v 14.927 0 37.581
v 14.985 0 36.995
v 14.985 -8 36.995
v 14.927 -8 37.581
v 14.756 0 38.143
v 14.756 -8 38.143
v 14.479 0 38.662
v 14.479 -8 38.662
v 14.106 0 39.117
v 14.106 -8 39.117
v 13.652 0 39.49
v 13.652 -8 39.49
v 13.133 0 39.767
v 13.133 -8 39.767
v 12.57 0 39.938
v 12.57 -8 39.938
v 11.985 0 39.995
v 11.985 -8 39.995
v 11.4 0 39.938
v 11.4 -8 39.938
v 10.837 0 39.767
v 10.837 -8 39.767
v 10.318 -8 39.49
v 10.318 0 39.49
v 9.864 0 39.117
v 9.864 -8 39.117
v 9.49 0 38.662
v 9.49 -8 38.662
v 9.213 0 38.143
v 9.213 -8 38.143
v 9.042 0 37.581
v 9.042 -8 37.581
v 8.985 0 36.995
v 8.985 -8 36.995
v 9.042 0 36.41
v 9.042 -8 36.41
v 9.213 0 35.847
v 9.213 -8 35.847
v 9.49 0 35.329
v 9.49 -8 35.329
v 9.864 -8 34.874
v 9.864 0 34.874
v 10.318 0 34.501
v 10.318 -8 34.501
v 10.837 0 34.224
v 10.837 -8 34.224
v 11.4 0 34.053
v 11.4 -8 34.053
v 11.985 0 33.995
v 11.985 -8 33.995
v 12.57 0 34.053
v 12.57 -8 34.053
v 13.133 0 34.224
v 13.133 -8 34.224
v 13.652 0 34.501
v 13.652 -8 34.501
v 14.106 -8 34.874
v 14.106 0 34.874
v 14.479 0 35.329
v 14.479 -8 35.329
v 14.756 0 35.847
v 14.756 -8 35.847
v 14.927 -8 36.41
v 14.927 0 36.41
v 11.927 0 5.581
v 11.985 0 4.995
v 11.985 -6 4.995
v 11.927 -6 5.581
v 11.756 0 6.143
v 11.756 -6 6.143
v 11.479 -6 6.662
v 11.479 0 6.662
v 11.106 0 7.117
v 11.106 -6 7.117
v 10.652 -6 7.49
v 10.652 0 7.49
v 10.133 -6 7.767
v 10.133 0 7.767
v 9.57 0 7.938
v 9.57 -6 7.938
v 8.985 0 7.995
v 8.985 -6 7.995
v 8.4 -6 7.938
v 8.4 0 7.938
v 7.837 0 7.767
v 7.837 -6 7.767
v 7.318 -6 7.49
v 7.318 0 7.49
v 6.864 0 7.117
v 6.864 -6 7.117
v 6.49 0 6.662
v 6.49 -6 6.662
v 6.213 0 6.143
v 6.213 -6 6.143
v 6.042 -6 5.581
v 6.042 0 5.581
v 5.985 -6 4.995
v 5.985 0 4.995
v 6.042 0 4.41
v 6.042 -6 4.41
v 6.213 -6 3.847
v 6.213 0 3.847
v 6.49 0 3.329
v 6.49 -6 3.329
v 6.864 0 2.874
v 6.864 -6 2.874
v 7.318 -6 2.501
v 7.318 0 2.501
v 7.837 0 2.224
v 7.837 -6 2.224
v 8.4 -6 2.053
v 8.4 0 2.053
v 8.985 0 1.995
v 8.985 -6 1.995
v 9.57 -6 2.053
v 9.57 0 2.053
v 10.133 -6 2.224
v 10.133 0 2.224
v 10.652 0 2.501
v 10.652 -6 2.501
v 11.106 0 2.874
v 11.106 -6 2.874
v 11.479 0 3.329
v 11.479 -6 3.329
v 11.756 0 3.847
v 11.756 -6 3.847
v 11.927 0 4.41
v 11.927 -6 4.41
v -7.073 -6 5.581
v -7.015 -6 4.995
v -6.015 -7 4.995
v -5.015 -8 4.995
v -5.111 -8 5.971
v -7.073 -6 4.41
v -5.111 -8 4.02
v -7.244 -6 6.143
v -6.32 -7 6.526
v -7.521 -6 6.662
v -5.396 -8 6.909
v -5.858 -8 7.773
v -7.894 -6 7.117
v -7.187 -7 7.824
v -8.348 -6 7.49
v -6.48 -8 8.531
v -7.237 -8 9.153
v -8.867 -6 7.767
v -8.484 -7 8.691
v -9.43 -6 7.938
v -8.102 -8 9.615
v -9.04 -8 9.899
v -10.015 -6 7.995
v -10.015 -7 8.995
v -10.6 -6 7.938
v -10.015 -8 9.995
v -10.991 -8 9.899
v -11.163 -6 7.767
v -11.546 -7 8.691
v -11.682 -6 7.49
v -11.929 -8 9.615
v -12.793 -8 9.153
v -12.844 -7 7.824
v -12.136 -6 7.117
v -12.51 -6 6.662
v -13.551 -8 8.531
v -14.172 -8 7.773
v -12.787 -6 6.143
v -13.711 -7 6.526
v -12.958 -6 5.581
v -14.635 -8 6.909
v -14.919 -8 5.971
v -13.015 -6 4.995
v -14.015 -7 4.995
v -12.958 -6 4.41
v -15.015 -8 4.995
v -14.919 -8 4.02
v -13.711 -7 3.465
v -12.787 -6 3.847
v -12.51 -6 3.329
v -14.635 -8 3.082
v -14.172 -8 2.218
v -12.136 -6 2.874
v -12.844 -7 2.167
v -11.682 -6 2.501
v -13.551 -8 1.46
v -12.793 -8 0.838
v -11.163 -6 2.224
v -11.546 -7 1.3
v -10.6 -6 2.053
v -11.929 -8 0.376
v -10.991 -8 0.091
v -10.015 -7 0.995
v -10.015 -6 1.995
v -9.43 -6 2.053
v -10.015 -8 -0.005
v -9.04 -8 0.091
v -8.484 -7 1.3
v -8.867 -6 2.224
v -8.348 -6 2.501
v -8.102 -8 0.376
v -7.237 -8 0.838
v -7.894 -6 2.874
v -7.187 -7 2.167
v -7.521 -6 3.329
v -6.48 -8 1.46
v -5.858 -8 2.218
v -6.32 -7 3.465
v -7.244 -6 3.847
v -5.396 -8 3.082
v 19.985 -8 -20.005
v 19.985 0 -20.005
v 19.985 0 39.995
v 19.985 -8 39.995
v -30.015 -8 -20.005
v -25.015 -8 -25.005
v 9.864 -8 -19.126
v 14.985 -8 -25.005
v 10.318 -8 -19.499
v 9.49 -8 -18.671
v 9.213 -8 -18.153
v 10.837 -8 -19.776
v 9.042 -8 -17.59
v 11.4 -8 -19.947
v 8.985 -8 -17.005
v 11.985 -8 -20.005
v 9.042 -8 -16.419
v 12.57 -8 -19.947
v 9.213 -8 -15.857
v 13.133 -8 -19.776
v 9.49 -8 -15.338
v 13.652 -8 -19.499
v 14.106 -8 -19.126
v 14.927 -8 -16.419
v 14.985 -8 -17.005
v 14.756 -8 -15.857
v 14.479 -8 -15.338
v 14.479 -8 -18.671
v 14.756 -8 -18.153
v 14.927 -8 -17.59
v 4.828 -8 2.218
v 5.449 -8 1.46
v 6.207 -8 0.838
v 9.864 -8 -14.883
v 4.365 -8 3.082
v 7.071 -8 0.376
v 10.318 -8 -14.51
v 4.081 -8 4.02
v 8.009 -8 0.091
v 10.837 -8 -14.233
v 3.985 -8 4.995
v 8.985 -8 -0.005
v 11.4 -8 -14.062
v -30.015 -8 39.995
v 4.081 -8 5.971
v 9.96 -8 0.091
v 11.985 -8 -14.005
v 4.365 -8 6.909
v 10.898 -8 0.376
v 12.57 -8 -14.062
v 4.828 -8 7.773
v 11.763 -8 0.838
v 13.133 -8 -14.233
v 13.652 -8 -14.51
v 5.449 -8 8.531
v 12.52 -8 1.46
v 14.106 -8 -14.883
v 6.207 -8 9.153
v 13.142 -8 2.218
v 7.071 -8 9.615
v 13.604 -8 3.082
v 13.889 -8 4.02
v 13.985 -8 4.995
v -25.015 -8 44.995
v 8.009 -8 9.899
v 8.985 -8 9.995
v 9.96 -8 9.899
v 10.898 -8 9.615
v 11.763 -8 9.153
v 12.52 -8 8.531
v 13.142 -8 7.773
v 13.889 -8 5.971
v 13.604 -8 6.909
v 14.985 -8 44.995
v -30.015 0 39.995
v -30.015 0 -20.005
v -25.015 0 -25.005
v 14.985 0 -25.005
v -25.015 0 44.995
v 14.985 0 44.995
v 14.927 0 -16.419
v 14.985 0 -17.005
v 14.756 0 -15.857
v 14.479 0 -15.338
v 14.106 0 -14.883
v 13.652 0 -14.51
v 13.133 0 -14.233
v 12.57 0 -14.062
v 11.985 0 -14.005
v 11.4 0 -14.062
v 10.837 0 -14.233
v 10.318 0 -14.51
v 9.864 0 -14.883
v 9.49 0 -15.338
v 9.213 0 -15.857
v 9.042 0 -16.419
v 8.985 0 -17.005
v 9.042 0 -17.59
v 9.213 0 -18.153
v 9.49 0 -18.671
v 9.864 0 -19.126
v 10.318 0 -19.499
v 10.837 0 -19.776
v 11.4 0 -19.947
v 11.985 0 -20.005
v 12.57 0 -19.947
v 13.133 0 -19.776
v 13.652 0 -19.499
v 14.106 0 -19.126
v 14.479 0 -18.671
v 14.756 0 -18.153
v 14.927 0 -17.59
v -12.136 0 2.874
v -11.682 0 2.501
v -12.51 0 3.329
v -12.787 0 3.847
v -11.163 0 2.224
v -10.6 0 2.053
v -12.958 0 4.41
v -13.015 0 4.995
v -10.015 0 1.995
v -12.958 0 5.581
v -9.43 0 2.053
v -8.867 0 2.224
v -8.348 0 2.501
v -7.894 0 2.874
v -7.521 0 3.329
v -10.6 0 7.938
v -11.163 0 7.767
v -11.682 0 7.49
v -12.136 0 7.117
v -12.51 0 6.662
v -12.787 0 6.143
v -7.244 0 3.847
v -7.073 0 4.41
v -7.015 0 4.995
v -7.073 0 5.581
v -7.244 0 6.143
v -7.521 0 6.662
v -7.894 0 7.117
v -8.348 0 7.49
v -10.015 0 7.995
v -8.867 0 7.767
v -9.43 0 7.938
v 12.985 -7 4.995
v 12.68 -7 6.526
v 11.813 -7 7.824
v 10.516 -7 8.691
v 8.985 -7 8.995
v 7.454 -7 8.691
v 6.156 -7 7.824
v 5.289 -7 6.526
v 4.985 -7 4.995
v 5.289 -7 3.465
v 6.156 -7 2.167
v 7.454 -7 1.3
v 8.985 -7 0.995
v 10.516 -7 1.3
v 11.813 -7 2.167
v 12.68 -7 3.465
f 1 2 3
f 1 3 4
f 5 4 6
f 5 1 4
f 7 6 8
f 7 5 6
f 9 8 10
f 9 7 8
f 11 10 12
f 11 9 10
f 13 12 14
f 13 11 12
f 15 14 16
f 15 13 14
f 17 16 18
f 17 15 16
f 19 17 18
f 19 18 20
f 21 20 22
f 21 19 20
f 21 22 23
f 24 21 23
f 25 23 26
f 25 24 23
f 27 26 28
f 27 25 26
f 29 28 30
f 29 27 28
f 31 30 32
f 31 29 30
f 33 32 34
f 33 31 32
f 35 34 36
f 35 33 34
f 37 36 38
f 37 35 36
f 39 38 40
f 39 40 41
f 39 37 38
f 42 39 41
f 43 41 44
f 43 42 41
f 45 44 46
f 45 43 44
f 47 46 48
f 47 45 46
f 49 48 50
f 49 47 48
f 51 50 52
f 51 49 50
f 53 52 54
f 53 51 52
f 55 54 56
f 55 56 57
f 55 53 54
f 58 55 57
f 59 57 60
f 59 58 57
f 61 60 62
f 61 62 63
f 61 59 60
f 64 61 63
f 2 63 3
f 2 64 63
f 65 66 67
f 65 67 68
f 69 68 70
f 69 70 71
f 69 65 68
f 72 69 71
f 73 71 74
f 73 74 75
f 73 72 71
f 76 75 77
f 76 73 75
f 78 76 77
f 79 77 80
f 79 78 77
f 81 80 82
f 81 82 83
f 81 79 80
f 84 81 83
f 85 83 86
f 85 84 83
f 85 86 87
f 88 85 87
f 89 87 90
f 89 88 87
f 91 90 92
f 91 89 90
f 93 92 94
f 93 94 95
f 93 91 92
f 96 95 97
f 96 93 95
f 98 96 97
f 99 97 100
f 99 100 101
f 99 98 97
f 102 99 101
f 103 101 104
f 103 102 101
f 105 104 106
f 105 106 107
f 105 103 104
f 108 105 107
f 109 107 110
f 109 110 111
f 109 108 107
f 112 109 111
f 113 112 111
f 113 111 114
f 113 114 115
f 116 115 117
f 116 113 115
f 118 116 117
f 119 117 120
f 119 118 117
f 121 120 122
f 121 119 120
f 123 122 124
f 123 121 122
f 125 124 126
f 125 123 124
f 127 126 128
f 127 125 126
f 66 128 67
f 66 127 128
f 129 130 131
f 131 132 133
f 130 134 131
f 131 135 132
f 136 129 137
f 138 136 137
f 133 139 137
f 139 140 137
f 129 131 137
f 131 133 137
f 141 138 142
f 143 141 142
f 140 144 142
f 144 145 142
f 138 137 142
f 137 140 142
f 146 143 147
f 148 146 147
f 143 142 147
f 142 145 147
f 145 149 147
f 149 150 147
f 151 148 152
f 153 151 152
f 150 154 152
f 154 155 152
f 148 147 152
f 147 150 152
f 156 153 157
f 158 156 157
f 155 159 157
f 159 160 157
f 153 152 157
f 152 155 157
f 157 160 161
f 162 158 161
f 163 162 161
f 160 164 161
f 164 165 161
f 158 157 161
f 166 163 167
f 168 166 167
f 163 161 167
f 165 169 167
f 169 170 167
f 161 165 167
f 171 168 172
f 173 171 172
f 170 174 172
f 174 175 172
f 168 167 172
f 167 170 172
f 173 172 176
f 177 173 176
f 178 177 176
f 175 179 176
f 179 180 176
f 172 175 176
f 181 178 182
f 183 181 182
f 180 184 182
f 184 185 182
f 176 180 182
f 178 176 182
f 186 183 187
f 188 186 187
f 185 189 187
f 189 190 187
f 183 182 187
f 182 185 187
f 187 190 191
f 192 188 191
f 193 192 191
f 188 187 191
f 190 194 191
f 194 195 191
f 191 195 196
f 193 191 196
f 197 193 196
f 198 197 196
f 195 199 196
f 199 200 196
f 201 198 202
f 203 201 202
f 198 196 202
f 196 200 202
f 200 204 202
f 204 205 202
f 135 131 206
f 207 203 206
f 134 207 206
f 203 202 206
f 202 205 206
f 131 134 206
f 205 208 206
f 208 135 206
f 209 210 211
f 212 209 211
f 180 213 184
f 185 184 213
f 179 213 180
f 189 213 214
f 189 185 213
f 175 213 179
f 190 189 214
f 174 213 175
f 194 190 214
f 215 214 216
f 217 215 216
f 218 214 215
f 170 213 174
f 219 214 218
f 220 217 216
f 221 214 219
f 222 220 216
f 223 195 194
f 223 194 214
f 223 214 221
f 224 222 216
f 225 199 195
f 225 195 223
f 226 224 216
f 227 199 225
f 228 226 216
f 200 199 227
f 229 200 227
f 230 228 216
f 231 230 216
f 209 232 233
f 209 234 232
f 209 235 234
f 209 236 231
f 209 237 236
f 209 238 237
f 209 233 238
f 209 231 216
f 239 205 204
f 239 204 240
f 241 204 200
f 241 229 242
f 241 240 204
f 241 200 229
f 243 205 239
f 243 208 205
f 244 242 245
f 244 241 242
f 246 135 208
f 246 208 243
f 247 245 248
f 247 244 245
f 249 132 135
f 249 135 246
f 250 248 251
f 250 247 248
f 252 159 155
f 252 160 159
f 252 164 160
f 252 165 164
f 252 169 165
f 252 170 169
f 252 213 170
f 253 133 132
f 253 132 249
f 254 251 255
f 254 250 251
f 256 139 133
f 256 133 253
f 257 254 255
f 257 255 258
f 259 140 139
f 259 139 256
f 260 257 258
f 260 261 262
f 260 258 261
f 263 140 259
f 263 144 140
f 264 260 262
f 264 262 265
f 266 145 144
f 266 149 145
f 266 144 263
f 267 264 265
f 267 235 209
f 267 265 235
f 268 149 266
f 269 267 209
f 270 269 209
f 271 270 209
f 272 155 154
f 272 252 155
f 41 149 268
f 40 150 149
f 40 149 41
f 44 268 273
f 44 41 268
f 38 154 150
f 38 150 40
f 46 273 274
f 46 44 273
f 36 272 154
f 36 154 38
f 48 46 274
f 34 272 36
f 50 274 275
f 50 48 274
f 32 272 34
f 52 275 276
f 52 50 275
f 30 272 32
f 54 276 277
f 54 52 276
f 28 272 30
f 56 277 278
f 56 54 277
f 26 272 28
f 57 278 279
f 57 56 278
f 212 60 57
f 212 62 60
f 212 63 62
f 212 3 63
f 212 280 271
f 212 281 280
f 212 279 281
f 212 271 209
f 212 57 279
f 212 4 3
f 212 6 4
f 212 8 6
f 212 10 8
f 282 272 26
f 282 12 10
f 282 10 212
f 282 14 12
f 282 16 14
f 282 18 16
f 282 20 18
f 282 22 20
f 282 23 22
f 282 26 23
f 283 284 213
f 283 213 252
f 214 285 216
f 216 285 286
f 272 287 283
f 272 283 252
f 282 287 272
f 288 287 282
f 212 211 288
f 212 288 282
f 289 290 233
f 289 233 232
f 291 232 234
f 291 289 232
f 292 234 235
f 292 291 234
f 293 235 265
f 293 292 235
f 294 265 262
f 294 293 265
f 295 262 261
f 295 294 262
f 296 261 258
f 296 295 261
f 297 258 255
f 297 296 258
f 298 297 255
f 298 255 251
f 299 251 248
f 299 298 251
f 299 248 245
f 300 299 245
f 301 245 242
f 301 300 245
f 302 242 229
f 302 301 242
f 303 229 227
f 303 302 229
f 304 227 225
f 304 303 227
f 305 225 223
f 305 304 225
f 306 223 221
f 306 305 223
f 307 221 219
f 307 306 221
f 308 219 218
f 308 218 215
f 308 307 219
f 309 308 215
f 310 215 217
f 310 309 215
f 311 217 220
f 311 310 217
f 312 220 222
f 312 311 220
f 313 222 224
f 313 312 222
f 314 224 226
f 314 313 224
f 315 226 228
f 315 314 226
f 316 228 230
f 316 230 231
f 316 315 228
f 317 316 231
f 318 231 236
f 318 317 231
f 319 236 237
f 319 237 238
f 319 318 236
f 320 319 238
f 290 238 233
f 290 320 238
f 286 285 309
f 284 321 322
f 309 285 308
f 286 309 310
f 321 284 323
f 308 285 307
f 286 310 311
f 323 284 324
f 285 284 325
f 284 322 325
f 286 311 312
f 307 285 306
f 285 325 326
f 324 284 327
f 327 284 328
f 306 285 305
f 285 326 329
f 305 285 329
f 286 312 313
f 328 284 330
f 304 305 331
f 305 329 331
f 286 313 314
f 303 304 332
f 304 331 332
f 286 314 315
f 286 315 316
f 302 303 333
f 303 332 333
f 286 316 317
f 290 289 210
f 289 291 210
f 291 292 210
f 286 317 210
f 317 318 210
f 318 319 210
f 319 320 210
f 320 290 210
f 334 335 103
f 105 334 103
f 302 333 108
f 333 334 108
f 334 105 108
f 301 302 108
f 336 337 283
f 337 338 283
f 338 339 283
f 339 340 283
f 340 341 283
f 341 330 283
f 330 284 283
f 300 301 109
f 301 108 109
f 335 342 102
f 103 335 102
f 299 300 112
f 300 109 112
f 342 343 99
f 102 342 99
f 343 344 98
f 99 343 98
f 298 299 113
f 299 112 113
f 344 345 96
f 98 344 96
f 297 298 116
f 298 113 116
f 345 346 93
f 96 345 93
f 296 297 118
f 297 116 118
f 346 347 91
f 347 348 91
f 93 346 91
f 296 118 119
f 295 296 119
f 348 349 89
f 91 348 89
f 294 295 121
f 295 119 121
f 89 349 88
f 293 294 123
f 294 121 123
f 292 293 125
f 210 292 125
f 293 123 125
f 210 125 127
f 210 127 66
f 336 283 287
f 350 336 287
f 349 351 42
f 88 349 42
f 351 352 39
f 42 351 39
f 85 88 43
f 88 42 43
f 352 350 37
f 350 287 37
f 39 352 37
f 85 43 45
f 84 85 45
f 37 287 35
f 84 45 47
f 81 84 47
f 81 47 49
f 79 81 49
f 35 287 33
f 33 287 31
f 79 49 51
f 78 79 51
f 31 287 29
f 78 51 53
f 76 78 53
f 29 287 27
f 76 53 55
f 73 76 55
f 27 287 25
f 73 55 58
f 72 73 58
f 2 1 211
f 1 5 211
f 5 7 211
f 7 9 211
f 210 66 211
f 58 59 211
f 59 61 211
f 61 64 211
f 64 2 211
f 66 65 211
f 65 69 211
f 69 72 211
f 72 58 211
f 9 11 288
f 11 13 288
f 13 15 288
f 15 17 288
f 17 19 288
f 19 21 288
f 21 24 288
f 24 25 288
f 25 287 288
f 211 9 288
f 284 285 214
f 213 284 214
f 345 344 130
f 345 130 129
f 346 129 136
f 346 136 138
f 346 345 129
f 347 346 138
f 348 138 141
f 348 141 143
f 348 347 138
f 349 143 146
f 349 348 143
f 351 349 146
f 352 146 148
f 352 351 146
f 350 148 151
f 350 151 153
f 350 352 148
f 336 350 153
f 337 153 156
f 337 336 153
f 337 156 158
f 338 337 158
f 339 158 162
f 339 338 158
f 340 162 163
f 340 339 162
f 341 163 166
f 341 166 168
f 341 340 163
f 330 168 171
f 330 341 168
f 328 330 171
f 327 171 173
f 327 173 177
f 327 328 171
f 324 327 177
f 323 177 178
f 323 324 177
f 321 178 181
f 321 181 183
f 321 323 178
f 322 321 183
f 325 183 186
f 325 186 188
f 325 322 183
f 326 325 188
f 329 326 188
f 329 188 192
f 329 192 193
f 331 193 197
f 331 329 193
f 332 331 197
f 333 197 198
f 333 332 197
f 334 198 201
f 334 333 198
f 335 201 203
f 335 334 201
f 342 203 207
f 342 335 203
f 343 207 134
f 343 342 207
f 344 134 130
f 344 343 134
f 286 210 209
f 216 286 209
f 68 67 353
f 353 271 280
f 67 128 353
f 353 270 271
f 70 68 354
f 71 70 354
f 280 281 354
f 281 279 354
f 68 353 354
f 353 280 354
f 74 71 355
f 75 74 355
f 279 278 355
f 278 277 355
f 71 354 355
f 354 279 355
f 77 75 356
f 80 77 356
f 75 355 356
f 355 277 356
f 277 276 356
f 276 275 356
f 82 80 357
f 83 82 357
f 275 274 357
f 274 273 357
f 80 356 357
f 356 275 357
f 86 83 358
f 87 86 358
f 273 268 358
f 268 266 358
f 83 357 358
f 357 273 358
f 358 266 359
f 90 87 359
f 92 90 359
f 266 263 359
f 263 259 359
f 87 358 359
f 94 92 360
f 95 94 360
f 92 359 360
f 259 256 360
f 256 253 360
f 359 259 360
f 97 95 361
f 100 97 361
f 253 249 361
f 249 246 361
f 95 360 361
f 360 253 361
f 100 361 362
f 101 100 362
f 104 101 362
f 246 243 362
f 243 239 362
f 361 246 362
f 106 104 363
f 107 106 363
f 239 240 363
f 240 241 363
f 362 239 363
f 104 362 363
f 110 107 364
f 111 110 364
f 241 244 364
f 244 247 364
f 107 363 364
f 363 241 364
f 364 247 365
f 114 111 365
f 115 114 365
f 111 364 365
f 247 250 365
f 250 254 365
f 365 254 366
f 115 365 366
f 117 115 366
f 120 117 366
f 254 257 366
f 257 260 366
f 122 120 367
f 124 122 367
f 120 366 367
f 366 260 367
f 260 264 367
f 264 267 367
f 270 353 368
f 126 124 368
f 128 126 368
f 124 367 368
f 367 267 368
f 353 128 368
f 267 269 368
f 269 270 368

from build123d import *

# Parameters (mm, degrees)
F0_W     = 50
F0_H     = 70
F0_R     = 3
F1_DEPTH = 8
F2_SIZE  = 2
F3_SIZE  = 5


with BuildPart() as f1:
    # F0 (on Front) → F1 (new body)
    with BuildSketch(Plane.XZ):
        with Locations((-5.015146, 9.995409)):
            Rectangle(F0_W, F0_H)
        with Locations((-10.015146, 4.995409)):
            Circle(F0_R, mode=Mode.SUBTRACT)
        with Locations((11.984854, -17.004591)):
            Circle(F0_R, mode=Mode.SUBTRACT)
        with Locations((8.984854, 4.995409)):
            Circle(F0_R, mode=Mode.SUBTRACT)
        with Locations((11.984854, 36.995409)):
            Circle(F0_R, mode=Mode.SUBTRACT)
    extrude(amount=F1_DEPTH)

    # F2
    f2_edges = [f1.edges().sort_by_distance(p)[0] for p in [
        (-13.015146, -8, 4.995409),
        (5.984854, -8, 4.995409),
    ]]
    chamfer(f2_edges, length=F2_SIZE)

    # F3
    f3_edges = [f1.edges().sort_by_distance(p)[0] for p in [
        (19.984854, -4, 44.995409),
        (19.984854, -4, -25.004591),
        (-30.015146, -4, 44.995409),
        (-30.015146, -4, -25.004591),
    ]]
    chamfer(f3_edges, length=F3_SIZE)


solid = f1.part
